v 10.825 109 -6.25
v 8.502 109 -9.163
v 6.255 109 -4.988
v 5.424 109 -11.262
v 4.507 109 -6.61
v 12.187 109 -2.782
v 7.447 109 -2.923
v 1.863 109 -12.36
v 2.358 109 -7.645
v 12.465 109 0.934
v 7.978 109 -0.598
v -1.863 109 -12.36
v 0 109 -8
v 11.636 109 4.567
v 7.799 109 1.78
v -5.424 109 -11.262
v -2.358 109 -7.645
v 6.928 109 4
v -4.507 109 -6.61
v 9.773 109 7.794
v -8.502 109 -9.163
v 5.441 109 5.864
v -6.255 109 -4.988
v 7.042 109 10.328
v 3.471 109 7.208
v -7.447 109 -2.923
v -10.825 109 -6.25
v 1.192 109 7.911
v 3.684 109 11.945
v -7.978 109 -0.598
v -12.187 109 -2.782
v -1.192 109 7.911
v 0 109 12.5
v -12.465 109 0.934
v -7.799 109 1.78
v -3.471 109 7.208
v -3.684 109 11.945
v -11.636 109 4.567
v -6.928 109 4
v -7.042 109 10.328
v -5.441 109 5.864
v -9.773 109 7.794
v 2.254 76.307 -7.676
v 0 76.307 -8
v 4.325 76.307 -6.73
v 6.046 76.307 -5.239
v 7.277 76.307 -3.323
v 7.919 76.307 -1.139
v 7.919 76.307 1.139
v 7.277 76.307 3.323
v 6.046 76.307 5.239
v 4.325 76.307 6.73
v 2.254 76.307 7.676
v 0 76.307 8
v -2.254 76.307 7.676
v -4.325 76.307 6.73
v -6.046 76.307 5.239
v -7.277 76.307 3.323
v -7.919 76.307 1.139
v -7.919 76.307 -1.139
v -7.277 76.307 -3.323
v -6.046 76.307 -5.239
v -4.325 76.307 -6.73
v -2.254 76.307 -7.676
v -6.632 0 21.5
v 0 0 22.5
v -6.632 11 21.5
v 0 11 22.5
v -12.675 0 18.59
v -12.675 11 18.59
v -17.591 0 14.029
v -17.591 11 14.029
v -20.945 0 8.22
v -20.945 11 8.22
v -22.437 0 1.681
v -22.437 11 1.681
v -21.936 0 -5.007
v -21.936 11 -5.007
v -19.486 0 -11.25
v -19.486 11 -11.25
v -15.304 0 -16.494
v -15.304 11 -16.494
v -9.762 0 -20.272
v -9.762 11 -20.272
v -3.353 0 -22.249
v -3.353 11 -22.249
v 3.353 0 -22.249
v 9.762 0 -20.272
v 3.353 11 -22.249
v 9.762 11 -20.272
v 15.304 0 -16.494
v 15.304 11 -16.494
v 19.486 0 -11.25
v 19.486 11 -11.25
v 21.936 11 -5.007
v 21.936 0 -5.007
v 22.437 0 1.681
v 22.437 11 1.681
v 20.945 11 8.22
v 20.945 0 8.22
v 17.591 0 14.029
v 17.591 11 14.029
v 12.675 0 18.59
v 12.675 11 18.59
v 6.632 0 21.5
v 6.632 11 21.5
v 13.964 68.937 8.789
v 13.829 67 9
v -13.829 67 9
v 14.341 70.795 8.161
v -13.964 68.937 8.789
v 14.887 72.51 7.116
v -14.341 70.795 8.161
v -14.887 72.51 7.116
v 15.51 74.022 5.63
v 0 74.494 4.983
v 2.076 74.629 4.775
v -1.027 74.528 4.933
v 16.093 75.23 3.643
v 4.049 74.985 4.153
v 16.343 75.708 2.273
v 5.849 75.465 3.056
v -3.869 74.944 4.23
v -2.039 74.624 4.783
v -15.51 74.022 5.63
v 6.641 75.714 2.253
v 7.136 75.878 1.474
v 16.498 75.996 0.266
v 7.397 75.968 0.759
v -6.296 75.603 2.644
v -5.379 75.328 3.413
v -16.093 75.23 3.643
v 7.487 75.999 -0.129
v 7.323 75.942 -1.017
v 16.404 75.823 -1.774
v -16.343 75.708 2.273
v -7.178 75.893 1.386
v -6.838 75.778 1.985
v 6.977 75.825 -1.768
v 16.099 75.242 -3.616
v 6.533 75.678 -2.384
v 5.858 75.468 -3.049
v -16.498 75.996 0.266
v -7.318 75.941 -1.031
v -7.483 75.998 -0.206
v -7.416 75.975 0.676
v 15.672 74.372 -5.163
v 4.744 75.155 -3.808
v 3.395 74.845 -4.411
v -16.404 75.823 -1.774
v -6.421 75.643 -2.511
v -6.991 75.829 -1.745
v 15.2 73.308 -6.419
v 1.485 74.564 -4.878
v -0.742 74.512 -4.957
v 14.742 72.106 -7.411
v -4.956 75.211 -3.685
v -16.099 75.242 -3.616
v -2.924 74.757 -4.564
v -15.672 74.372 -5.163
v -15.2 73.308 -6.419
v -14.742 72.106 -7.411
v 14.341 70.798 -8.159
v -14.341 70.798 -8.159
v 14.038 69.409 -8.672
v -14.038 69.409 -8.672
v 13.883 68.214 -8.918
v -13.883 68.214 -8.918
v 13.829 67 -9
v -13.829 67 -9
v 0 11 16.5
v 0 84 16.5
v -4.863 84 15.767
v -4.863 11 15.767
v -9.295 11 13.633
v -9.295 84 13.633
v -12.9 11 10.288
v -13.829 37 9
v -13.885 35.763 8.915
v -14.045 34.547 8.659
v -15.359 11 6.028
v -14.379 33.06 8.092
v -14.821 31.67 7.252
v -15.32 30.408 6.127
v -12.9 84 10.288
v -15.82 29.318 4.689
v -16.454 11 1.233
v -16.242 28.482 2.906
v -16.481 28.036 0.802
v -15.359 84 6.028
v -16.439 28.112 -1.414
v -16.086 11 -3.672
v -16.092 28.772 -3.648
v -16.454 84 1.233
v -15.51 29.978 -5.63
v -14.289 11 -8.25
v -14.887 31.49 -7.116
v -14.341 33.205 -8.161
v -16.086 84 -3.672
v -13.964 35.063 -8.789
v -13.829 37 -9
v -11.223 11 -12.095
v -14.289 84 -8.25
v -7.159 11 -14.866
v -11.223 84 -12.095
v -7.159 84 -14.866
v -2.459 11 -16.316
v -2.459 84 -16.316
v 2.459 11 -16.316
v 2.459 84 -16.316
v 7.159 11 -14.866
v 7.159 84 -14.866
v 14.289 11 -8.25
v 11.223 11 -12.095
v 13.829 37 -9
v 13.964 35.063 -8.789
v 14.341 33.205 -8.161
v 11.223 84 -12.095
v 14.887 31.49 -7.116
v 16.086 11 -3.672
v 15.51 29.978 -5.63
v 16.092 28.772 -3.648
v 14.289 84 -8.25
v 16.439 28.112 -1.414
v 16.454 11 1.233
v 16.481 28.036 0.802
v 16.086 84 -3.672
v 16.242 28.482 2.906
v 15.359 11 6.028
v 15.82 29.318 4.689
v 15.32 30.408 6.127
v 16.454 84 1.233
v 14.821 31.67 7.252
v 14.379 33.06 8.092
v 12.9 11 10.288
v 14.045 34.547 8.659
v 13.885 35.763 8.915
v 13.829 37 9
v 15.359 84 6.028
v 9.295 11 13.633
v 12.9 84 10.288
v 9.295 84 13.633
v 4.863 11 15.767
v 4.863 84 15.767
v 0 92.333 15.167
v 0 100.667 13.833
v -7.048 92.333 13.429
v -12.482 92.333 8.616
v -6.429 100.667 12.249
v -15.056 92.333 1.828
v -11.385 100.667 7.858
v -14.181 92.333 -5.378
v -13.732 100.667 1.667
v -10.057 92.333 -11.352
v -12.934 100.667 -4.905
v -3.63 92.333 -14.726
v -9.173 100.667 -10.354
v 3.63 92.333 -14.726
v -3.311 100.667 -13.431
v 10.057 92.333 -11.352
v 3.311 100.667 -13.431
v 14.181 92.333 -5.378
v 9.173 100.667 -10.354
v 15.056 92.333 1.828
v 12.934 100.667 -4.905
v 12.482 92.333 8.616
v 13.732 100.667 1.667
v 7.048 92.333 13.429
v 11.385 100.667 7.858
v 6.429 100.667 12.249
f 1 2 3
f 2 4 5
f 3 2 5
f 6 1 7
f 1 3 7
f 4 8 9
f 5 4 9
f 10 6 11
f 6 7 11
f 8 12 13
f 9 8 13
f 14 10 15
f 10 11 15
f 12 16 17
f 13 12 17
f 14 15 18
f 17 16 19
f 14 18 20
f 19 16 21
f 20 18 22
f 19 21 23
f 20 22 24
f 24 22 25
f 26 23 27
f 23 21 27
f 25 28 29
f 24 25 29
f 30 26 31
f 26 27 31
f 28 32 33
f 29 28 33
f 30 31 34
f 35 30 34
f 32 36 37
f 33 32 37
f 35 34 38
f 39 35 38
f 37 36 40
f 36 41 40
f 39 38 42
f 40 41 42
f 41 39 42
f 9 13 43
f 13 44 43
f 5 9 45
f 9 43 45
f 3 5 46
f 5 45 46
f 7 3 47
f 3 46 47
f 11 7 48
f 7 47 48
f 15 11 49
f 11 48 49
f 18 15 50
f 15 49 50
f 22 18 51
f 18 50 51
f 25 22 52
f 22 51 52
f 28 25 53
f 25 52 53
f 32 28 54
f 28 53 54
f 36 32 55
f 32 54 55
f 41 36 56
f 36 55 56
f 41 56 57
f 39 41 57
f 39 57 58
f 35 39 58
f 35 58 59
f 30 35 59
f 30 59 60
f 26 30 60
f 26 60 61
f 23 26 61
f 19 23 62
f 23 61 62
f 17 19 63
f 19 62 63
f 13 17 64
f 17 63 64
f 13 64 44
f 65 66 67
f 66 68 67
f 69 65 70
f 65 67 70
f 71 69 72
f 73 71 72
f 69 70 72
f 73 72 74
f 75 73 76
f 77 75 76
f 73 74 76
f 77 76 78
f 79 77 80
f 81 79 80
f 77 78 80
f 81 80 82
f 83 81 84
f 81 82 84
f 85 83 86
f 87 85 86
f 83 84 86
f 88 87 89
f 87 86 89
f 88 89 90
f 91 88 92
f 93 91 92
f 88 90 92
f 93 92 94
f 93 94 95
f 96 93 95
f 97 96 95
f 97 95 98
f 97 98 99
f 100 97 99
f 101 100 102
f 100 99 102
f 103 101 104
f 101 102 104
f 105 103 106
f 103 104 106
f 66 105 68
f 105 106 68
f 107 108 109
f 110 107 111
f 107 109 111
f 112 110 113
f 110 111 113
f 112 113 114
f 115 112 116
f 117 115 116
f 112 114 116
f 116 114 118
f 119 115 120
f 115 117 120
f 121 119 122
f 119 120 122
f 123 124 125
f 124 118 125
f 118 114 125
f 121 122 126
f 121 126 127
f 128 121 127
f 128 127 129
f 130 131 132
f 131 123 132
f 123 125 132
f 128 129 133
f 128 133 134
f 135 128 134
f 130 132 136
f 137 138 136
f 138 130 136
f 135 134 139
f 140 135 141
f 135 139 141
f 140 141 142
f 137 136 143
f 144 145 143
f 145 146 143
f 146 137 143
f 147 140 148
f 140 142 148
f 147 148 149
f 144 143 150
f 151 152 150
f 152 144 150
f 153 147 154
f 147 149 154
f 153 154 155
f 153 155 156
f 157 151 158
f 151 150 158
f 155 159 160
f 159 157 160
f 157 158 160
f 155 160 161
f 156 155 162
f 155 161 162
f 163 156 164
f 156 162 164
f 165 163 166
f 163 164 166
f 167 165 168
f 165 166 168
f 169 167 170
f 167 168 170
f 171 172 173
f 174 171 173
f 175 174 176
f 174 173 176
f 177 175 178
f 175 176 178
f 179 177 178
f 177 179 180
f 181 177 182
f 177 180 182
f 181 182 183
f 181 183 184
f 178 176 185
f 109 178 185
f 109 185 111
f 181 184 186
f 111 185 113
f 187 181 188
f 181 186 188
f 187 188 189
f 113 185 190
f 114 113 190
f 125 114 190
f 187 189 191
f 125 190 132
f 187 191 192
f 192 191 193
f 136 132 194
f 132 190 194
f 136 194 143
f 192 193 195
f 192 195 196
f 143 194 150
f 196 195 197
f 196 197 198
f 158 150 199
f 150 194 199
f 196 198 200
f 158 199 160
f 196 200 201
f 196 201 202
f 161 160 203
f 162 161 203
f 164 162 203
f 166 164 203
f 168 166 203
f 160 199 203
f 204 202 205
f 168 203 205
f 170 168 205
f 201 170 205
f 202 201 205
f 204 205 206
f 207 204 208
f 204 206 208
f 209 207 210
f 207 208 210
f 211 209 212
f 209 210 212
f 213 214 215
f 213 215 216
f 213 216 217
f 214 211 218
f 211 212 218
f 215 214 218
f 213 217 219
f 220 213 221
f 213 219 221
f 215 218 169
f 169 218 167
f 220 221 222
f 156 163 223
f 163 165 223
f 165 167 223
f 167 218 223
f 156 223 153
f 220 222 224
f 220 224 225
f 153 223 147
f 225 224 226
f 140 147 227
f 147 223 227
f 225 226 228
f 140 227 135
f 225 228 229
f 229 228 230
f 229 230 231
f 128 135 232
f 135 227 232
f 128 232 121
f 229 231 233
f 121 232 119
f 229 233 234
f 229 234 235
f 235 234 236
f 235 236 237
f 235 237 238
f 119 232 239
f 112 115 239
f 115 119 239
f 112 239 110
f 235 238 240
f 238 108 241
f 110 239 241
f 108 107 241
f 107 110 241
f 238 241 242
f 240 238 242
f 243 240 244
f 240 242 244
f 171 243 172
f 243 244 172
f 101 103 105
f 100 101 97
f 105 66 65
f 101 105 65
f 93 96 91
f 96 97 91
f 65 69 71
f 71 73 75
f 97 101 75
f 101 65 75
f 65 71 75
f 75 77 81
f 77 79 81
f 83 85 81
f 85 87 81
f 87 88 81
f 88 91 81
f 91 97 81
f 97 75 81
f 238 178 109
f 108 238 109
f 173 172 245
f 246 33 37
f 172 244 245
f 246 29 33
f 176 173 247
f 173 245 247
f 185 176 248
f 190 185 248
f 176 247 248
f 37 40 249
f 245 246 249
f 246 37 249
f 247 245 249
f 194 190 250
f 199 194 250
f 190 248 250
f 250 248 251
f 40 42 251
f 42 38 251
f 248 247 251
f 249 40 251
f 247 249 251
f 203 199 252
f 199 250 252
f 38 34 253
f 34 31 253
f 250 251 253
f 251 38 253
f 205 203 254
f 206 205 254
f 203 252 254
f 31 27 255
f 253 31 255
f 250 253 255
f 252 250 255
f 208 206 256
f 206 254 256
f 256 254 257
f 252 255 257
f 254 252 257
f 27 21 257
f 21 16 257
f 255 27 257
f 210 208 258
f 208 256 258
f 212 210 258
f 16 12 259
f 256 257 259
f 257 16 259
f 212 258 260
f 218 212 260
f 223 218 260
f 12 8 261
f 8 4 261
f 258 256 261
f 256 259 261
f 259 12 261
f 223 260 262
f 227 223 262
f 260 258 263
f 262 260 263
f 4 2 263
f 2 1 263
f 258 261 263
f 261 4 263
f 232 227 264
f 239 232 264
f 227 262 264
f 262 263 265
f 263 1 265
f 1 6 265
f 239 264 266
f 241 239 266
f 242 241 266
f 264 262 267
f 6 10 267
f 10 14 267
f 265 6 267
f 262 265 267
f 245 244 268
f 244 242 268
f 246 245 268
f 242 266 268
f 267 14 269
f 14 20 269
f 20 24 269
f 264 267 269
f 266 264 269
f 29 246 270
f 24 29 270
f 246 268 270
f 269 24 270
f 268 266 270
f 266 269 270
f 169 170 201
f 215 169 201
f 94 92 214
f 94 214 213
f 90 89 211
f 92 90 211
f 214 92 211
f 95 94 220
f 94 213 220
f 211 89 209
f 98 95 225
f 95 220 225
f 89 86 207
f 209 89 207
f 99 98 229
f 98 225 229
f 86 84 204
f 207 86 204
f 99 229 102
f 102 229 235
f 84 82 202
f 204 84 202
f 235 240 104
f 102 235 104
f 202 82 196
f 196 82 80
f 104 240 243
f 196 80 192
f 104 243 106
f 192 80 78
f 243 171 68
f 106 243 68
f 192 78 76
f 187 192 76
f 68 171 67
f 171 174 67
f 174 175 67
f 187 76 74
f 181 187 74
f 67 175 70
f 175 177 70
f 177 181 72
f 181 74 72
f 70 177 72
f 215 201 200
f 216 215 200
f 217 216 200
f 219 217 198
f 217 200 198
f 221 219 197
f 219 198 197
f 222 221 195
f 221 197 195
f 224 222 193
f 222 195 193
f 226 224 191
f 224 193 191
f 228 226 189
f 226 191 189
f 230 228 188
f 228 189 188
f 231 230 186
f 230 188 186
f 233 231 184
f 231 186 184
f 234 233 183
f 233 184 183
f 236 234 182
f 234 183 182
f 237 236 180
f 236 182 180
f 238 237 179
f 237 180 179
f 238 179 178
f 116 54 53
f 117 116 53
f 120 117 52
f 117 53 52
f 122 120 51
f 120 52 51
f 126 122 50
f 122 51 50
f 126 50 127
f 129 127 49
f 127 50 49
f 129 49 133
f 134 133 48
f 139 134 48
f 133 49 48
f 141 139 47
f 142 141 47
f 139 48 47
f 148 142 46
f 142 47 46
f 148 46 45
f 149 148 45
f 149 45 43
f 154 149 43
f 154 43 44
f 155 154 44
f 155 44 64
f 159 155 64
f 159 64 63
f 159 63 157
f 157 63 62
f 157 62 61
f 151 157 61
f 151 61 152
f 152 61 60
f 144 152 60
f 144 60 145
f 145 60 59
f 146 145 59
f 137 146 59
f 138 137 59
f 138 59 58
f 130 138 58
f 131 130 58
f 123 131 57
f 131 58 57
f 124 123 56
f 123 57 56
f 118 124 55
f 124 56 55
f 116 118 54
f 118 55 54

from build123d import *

# Parameters (mm, degrees)
CUT_EXTRUDE1_DEPTH         = 114.549548656
CUT_EXTRUDE1_DEPTH_BACK    = 114.549548656
F_16_0MM_DOWEL_HOLE1_D     = 16
F_16_0MM_DOWEL_HOLE1_DEPTH = 32.693115048
F_16_0MM_DOWEL_HOLE1_TIP   = 4.806884952


with BuildPart() as part:
    # Sketch1 → Revolve1 (revolve)
    with BuildSketch(Plane(origin=(0, 0, 0), x_dir=(0, 0, -1), z_dir=(1, 0, 0))):
        Polygon((0, 0), (-22.5, 0), (-22.5, 11), (-16.5, 11), (-16.5, 84), (-12.5, 109), (0, 109), align=None)
    revolve(axis=Axis((0, 109, 0), (0, -1, 0)))

    # Sketch2 → Cut-Extrude1 (cut, two sides: drawn at the far end of the back side and taken through both)
    with BuildSketch(Plane(origin=(0, 0, 0), x_dir=(0, 0, -1), z_dir=(1, 0, 0)).offset(-CUT_EXTRUDE1_DEPTH_BACK)):
        with BuildLine():
            Line((-9, 37), (-9, 67))
            ThreePointArc((-9, 67), (0, 76), (9, 67))
            Line((9, 67), (9, 37))
            ThreePointArc((9, 37), (0, 28), (-9, 37))
        make_face()
    extrude(amount=CUT_EXTRUDE1_DEPTH + CUT_EXTRUDE1_DEPTH_BACK, mode=Mode.SUBTRACT)

    # Ø16.0mm Dowel Hole1
    with Locations(Plane.ZX.offset(109)):
        with Locations((0, 0)):
            Hole(F_16_0MM_DOWEL_HOLE1_D / 2, depth=F_16_0MM_DOWEL_HOLE1_DEPTH)
            with Locations((0, 0, -(F_16_0MM_DOWEL_HOLE1_DEPTH + F_16_0MM_DOWEL_HOLE1_TIP / 2))):  # 118° drill point
                Cone(0, F_16_0MM_DOWEL_HOLE1_D / 2, F_16_0MM_DOWEL_HOLE1_TIP, mode=Mode.SUBTRACT)


solid = part.part
